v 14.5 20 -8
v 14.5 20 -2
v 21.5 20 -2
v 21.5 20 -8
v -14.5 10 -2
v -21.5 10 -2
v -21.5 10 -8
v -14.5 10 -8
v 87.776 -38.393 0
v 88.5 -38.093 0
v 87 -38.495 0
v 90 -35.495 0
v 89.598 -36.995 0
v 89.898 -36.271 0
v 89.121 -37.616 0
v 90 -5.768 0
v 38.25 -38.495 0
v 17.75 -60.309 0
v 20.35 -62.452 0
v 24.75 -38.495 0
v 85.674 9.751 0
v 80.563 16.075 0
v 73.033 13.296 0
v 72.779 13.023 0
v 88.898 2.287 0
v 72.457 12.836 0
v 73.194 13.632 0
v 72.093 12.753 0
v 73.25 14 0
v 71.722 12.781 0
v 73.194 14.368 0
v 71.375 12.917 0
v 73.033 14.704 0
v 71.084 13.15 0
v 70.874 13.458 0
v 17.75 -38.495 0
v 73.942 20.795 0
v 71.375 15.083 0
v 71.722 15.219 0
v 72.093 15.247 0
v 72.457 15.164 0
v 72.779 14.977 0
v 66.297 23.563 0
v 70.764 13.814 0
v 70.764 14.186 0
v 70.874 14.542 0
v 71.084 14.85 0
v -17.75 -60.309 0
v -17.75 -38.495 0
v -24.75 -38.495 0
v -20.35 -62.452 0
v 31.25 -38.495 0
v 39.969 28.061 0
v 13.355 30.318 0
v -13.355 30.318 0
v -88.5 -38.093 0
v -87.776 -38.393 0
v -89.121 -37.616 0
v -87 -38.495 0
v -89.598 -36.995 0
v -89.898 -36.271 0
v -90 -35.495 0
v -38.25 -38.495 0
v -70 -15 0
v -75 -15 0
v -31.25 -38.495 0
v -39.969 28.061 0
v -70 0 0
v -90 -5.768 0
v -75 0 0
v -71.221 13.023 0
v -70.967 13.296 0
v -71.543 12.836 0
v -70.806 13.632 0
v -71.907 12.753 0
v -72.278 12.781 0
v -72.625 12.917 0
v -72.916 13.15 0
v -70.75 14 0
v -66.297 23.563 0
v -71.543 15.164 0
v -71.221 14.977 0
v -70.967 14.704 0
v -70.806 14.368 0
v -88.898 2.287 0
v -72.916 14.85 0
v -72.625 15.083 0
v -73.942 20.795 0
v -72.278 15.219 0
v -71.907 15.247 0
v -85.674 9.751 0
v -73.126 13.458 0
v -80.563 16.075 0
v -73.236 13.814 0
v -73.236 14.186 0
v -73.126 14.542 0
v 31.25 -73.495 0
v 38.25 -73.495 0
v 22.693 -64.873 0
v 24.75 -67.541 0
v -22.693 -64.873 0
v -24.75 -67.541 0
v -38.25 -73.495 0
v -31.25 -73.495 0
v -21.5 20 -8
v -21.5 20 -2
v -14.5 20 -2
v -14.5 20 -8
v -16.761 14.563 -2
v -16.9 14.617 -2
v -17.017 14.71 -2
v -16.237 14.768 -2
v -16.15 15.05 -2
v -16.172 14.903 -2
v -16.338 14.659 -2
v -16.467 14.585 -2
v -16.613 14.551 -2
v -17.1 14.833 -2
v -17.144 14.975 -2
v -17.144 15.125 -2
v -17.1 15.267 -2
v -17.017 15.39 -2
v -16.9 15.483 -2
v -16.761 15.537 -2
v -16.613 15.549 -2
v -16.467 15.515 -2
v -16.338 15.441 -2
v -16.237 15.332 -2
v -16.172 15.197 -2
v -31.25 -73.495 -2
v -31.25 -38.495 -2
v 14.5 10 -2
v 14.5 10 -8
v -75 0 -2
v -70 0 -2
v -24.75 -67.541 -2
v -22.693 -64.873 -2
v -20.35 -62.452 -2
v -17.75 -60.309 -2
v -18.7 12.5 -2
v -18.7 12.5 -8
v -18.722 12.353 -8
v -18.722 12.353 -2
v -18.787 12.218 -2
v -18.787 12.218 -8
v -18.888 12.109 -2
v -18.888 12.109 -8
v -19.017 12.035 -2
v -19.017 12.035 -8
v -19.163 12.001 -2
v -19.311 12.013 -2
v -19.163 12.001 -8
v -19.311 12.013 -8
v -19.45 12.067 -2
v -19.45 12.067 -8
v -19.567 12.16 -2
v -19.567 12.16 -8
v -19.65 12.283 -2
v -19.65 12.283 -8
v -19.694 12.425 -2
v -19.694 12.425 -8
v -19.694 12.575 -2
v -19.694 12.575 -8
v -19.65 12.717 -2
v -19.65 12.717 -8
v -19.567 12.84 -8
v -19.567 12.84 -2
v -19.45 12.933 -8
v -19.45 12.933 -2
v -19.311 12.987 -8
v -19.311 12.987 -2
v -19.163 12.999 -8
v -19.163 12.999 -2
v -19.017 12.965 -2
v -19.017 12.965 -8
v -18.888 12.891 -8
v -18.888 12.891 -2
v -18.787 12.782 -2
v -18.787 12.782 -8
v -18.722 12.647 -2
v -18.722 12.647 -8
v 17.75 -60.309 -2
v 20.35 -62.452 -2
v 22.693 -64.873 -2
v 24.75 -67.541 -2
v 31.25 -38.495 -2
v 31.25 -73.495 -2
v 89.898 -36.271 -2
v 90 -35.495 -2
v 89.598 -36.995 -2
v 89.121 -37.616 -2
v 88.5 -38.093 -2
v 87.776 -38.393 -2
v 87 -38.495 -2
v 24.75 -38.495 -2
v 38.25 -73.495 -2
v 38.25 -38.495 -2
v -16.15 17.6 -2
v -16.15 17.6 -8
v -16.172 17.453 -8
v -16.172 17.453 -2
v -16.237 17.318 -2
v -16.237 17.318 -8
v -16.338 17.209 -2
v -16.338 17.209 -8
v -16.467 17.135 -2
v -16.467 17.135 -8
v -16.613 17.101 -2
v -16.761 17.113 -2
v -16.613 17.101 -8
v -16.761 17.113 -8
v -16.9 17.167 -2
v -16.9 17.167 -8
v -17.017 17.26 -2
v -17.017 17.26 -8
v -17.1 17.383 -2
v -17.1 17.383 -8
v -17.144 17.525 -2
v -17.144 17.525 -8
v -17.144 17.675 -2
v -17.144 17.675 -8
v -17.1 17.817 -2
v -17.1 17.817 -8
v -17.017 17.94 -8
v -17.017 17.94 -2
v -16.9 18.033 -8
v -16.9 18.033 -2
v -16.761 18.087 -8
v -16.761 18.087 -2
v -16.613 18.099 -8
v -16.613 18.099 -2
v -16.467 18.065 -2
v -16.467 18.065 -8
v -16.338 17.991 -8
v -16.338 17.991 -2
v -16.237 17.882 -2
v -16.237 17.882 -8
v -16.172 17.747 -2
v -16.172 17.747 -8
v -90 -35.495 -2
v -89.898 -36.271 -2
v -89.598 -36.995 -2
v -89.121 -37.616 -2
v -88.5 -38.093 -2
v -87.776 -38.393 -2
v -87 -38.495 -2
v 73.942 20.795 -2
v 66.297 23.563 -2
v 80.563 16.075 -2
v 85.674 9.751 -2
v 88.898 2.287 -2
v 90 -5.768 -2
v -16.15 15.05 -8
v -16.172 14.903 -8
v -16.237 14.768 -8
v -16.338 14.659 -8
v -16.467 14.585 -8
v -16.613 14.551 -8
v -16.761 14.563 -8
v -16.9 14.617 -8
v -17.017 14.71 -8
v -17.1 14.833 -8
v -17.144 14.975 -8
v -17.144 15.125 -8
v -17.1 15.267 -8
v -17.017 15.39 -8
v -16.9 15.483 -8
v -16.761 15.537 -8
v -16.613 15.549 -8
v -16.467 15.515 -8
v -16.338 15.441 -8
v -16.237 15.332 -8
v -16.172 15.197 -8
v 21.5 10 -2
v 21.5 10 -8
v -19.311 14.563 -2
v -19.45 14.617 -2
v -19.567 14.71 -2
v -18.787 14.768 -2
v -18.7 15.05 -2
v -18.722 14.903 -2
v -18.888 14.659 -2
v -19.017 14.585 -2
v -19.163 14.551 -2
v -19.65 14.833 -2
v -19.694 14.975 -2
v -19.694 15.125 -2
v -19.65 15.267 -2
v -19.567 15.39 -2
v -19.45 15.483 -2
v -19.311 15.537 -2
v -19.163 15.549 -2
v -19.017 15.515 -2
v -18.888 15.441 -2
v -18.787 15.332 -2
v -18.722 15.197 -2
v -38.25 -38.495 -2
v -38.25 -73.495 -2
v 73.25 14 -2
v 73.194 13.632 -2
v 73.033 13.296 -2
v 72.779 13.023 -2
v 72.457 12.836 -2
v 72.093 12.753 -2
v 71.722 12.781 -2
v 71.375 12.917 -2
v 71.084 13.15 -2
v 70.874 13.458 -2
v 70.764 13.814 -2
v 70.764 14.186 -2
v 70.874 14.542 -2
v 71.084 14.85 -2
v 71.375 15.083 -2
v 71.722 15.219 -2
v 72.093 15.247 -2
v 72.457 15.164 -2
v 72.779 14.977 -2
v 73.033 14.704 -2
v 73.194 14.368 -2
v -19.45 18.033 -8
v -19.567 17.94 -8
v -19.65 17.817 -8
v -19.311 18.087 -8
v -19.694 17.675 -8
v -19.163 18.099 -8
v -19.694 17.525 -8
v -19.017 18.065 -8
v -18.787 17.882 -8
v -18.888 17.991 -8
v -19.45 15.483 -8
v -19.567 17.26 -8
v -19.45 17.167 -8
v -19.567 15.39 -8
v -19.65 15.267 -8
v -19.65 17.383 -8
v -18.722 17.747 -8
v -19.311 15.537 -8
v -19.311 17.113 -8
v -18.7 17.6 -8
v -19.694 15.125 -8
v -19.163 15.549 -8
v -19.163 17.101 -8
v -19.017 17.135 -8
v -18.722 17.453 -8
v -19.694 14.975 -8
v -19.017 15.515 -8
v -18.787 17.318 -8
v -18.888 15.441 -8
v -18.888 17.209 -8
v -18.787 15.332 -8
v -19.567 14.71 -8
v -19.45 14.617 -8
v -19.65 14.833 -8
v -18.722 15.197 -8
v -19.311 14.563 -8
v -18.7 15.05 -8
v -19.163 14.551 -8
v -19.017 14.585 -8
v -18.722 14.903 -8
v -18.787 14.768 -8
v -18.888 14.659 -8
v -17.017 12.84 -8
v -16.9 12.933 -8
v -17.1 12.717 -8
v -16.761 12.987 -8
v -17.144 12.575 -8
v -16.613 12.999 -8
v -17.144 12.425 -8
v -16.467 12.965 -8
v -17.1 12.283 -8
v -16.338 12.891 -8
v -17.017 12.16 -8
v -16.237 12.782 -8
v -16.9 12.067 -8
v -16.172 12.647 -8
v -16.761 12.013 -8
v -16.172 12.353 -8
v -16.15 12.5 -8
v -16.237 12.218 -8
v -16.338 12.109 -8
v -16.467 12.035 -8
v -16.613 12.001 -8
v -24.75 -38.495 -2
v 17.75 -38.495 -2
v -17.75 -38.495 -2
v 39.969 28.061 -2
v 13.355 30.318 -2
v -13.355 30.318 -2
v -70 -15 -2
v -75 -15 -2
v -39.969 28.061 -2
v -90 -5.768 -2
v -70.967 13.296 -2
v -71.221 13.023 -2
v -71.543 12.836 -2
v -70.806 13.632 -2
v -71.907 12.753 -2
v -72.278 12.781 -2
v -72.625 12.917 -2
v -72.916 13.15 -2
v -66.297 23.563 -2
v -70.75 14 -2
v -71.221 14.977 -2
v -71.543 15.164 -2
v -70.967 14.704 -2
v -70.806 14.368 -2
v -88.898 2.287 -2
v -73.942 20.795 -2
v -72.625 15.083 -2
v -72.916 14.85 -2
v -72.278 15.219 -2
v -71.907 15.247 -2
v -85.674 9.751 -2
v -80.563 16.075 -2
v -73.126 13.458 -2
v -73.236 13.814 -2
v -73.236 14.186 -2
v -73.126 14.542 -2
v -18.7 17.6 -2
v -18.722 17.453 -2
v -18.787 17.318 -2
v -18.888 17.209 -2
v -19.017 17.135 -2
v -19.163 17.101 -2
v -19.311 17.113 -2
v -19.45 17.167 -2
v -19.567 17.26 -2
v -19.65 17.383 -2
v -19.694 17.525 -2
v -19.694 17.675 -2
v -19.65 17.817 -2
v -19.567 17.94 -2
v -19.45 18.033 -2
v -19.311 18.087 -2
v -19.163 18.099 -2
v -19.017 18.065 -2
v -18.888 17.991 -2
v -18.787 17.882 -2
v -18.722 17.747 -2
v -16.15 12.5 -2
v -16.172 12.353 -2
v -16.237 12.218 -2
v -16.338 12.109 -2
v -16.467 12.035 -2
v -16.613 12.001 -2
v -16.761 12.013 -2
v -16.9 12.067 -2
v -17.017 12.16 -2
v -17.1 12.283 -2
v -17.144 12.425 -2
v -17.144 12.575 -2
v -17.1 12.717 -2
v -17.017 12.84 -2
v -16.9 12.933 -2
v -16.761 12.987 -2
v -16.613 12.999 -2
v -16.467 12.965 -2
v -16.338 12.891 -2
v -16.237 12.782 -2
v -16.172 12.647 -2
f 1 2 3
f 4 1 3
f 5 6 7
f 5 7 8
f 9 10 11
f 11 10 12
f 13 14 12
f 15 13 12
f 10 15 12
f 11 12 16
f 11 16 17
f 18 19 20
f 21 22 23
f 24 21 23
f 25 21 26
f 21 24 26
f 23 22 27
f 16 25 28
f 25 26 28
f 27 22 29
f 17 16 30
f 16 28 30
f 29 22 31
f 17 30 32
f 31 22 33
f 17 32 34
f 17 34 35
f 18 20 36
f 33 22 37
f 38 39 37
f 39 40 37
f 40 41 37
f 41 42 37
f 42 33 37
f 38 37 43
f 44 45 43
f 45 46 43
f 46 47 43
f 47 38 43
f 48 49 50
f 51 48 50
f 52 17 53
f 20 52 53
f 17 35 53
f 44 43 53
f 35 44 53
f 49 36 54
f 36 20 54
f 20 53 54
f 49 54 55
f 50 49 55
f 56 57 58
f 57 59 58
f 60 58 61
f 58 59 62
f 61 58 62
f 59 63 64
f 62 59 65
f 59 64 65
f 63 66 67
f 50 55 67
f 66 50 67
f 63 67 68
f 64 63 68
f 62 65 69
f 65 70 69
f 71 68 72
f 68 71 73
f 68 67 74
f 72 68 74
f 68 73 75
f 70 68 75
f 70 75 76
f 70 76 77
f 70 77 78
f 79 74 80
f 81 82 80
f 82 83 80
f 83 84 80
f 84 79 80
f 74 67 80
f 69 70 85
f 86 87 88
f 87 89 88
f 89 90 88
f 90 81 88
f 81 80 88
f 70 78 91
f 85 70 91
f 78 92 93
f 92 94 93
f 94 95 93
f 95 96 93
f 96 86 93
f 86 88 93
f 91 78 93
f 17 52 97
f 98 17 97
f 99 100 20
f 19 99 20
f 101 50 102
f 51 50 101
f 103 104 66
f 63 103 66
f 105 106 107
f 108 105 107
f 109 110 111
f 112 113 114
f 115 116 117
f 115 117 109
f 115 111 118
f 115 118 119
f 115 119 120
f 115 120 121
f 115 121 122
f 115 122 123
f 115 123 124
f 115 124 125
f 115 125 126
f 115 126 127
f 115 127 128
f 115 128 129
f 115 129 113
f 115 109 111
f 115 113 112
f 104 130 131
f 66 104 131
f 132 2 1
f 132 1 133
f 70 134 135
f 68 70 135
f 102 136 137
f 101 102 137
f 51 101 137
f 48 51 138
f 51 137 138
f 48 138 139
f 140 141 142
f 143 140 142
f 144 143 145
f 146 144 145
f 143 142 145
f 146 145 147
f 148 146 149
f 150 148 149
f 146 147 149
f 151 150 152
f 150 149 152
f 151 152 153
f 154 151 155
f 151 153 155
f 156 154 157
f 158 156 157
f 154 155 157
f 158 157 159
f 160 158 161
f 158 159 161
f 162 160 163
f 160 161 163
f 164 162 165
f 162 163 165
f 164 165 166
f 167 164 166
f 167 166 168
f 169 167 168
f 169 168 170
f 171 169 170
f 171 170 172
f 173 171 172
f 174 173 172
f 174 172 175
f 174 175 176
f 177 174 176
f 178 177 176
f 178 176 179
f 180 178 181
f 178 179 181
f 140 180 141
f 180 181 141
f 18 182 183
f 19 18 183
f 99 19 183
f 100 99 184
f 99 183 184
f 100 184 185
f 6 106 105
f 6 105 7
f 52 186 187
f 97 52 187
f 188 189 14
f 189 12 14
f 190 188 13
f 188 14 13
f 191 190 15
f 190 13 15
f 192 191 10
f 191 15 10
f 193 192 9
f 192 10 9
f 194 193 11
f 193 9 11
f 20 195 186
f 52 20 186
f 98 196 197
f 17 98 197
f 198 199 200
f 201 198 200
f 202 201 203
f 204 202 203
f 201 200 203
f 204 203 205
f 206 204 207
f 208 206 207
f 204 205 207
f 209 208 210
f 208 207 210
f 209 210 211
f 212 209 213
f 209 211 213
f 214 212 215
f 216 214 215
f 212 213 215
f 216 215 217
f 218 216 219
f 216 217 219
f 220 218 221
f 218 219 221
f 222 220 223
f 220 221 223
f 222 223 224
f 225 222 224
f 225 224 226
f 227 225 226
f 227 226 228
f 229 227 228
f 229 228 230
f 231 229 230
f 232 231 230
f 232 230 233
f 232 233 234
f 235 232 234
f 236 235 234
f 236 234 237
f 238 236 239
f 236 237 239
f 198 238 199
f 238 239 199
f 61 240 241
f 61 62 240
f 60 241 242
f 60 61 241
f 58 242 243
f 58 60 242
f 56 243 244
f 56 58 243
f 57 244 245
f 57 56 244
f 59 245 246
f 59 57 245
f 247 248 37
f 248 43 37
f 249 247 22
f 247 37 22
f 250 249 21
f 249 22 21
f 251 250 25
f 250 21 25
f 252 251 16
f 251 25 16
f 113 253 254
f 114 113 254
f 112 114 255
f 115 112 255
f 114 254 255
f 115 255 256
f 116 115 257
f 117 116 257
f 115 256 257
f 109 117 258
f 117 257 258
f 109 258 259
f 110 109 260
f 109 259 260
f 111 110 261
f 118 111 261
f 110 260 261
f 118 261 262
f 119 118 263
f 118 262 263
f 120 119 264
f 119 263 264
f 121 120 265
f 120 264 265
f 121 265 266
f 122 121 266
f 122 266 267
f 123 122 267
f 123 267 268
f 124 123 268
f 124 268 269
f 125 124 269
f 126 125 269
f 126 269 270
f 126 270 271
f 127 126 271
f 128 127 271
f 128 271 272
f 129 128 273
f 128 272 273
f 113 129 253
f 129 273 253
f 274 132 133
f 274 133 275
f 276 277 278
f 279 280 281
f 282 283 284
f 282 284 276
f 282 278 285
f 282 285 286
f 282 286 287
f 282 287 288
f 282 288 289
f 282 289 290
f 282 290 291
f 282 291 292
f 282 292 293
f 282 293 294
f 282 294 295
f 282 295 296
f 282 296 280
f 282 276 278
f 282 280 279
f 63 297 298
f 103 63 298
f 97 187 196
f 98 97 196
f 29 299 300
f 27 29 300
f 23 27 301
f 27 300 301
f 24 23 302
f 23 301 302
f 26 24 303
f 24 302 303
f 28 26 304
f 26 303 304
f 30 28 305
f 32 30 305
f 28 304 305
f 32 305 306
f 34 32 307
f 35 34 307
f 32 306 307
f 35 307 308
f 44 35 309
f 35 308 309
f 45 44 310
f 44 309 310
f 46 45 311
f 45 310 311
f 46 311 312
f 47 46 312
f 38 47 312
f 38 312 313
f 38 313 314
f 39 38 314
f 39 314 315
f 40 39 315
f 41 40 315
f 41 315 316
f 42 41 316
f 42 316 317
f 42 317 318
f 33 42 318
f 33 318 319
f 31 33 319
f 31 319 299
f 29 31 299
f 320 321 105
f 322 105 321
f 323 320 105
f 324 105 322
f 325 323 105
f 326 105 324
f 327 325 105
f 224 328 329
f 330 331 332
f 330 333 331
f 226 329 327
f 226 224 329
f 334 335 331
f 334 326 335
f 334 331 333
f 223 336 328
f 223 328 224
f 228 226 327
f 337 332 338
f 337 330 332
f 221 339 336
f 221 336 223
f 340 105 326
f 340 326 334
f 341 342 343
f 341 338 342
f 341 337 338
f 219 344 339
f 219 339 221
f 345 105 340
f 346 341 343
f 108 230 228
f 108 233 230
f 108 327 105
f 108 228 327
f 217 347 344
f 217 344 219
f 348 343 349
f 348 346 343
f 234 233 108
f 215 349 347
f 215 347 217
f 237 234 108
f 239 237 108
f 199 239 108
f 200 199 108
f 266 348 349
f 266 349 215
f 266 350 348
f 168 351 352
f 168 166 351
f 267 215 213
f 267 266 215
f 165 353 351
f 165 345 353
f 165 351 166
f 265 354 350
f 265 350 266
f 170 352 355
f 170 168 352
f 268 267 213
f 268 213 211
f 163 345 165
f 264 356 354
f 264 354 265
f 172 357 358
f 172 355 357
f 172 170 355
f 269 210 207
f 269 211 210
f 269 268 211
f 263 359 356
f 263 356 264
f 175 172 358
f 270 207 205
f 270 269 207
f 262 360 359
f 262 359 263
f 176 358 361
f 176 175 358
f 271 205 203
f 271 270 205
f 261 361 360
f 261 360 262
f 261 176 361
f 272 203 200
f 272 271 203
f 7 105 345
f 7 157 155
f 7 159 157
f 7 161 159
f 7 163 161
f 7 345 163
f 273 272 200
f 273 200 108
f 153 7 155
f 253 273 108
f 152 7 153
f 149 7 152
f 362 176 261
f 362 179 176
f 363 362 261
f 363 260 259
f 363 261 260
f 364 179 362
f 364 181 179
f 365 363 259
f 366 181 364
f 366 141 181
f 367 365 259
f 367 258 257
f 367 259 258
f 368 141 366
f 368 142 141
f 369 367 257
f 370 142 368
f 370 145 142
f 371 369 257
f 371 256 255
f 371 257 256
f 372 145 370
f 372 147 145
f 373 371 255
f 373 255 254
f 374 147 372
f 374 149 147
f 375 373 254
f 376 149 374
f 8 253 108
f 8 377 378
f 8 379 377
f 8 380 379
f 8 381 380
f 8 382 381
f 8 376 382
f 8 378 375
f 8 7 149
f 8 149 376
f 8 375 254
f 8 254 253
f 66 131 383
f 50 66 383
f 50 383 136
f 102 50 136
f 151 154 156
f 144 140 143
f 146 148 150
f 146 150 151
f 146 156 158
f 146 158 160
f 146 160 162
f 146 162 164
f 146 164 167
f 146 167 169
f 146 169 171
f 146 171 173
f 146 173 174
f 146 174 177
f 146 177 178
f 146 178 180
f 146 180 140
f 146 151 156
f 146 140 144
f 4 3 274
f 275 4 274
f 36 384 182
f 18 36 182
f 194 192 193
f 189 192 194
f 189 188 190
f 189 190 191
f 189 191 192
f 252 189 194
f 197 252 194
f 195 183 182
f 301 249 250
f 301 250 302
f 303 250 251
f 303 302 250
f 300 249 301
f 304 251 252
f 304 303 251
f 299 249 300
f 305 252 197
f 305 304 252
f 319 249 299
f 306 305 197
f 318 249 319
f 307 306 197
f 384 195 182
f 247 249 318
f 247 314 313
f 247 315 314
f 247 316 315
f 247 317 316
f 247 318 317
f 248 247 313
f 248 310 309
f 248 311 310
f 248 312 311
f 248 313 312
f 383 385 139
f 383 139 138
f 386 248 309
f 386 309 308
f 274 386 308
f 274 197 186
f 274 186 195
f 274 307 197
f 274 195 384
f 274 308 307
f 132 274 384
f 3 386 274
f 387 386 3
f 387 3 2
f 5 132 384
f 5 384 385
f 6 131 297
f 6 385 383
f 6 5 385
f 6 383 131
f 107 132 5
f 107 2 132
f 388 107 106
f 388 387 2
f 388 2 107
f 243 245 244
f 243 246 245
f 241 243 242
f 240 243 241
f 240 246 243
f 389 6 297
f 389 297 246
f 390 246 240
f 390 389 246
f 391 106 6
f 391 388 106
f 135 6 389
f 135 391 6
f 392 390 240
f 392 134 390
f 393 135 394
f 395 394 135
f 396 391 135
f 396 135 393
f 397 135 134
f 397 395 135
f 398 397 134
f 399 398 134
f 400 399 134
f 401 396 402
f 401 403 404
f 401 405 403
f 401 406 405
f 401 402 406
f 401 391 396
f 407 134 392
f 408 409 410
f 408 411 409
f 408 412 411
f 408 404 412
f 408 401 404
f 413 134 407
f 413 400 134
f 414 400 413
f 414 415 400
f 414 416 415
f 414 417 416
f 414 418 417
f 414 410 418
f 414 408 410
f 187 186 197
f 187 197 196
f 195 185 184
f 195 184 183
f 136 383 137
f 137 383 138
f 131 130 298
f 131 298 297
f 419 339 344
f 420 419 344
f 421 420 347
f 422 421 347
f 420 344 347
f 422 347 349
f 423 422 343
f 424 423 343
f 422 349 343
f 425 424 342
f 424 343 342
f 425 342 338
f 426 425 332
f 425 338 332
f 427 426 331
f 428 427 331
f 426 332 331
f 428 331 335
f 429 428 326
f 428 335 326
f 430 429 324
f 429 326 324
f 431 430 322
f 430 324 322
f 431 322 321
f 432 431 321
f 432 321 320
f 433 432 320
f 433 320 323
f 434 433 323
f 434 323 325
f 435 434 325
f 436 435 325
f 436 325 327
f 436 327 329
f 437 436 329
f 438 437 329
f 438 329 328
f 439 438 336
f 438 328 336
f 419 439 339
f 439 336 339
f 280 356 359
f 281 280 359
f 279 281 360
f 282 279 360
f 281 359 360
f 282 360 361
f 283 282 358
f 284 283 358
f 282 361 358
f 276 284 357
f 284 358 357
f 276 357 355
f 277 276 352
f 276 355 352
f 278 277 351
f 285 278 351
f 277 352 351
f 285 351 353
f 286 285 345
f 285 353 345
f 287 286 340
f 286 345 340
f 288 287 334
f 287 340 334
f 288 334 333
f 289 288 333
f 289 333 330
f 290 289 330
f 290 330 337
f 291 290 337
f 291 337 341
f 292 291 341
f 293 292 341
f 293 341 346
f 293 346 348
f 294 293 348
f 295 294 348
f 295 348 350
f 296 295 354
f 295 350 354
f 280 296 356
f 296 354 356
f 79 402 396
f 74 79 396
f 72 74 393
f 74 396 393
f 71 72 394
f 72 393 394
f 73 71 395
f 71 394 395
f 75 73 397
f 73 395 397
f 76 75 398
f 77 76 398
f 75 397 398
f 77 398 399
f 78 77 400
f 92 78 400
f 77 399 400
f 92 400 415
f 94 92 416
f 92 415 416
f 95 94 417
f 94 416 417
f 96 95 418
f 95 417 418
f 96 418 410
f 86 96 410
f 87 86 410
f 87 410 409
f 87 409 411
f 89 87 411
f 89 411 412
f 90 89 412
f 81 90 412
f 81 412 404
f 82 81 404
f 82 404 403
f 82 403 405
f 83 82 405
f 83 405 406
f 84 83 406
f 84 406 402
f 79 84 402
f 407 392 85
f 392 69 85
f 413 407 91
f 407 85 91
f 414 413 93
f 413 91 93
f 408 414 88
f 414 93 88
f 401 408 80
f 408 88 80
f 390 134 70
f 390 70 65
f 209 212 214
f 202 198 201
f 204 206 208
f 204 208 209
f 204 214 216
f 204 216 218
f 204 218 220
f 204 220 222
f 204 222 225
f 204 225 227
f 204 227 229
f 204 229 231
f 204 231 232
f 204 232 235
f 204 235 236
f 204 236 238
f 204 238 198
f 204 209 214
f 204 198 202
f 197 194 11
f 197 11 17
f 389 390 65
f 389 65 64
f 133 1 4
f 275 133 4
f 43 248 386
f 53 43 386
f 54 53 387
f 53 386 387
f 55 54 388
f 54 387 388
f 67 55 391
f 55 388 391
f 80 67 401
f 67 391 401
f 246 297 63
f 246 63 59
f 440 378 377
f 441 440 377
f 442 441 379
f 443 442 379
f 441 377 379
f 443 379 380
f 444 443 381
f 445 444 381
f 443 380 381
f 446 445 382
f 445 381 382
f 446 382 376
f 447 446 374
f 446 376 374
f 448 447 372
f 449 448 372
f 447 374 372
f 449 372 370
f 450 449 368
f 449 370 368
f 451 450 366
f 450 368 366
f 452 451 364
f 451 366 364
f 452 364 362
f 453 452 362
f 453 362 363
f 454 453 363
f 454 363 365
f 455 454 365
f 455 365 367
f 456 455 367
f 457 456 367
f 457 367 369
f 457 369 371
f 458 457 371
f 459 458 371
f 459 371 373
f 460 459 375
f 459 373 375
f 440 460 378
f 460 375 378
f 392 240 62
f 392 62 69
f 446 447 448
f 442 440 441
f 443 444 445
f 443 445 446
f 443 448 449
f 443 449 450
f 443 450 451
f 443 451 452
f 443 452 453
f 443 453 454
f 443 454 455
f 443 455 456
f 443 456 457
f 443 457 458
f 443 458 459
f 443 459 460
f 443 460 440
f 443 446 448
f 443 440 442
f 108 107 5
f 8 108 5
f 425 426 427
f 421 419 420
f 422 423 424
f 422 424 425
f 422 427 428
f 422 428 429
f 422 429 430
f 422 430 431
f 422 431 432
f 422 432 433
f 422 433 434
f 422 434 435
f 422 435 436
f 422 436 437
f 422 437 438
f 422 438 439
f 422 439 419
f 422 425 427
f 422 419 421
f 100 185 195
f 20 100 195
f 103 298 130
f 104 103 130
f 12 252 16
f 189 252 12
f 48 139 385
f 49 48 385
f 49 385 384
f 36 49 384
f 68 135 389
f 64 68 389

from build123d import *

# Parameters (mm, degrees)
PAD019_DEPTH    = 2
FILLET016_R     = 30
SKETCH039_R     = 1.25
POCKET019_DEPTH = 2.001
FILLET017_R     = 3
SKETCH041_W     = 5
SKETCH041_H     = 15
POCKET020_DEPTH = 5
SKETCH042_W     = 7
SKETCH042_H     = 10
PAD020_DEPTH    = 6
SKETCH044_R     = 0.5
POCKET021_DEPTH = 6
SKETCH045_R     = 30
POCKET022_DEPTH = 7


with BuildPart() as part:
    # Sketch038 → Pad019 (new body)
    with BuildSketch(Plane.XY):
        with BuildLine():
            Line((-90, -38.494821), (-90, 17.505179))
            ThreePointArc((90, 17.505179), (0, 30.6), (-90, 17.505179))
            Line((90, 17.505179), (90, -38.494821))
            Line((90, -38.494821), (38.25, -38.494821))
            Line((38.25, -73.494821), (38.25, -38.494821))
            Line((31.25, -73.494821), (38.25, -73.494821))
            Line((31.25, -38.494821), (31.25, -73.494821))
            Line((24.75, -38.494821), (31.25, -38.494821))
            Line((24.75, -73.494821), (24.75, -38.494821))
            Line((17.75, -73.494821), (24.75, -73.494821))
            Line((17.75, -38.494821), (17.75, -73.494821))
            Line((-17.75, -38.494821), (17.75, -38.494821))
            Line((-17.75, -73.494821), (-17.75, -38.494821))
            Line((-24.75, -73.494821), (-17.75, -73.494821))
            Line((-24.75, -38.494821), (-24.75, -73.494821))
            Line((-31.25, -38.494821), (-24.75, -38.494821))
            Line((-31.25, -73.494821), (-31.25, -38.494821))
            Line((-38.25, -73.494821), (-31.25, -73.494821))
            Line((-38.25, -38.494821), (-38.25, -73.494821))
            Line((-38.25, -38.494821), (-90, -38.494821))
        make_face()
    extrude(amount=PAD019_DEPTH)

    # Fillet016
    fillet016_edges = [part.edges().sort_by_distance(p)[0] for p in [
        (90, 17.505179, 1),
        (-90, 17.505179, 1),
    ]]
    fillet(fillet016_edges, radius=FILLET016_R)

    # Sketch039 (on Face2 of Fillet016) → Pocket019 (cut, through all)
    with BuildSketch(Plane(origin=(0, 0, 0), x_dir=(1, 0, 0), z_dir=(0, 0, -1))):
        with Locations((-72, -14)):
            Circle(SKETCH039_R)
        with Locations((72, -14)):
            Circle(SKETCH039_R)
    extrude(amount=-POCKET019_DEPTH, mode=Mode.SUBTRACT)

    # Fillet017
    fillet017_edges = [part.edges().sort_by_distance(p)[0] for p in [
        (-90, -38.494821, 1),
        (90, -38.494821, 1),
    ]]
    fillet(fillet017_edges, radius=FILLET017_R)

    # Sketch041 (on Face2 of Fillet017) → Pocket020 (cut)
    with BuildSketch(Plane(origin=(0, 0, 0), x_dir=(1, 0, 0), z_dir=(0, 0, -1))):
        with Locations((-72.5, 7.5)):
            Rectangle(SKETCH041_W, SKETCH041_H)
    extrude(amount=-POCKET020_DEPTH, mode=Mode.SUBTRACT)

    # Sketch042 (on Face2 of Pocket020) → Pad020 (join)
    with BuildSketch(Plane(origin=(0, 0, 0), x_dir=(1, 0, 0), z_dir=(0, 0, -1))):
        with Locations((18, -15)):
            Rectangle(SKETCH042_W, SKETCH042_H)
        with Locations((-18, -15)):
            Rectangle(SKETCH042_W, SKETCH042_H)
    extrude(amount=PAD020_DEPTH)

    # Sketch044 (on Face42 of Pad020) → Pocket021 (cut)
    with BuildSketch(Plane(origin=(0, 0, -6), x_dir=(1, 0, 0), z_dir=(0, 0, -1))):
        with Locations((-19.2, -12.5)):
            Circle(SKETCH044_R)
        with Locations((-16.65, -12.5)):
            Circle(SKETCH044_R)
        with Locations((-19.2, -15.05)):
            Circle(SKETCH044_R)
        with Locations((-16.65, -15.05)):
            Circle(SKETCH044_R)
        with Locations((-19.2, -17.6)):
            Circle(SKETCH044_R)
        with Locations((-16.65, -17.6)):
            Circle(SKETCH044_R)
    extrude(amount=-POCKET021_DEPTH, mode=Mode.SUBTRACT)

    # Sketch045 (on Face2 of Pocket021) → Pocket022 (cut)
    with BuildSketch(Plane(origin=(0, 0, 0), x_dir=(1, 0, 0), z_dir=(0, 0, -1))):
        with Locations((0, 84.494821)):
            Circle(SKETCH045_R)
    extrude(amount=-POCKET022_DEPTH, mode=Mode.SUBTRACT)


with BuildPart() as part_1:
    # Body014 placement: moved
    add(part.part.moved(Location((0, 0, -2))))


solid = part_1.part
